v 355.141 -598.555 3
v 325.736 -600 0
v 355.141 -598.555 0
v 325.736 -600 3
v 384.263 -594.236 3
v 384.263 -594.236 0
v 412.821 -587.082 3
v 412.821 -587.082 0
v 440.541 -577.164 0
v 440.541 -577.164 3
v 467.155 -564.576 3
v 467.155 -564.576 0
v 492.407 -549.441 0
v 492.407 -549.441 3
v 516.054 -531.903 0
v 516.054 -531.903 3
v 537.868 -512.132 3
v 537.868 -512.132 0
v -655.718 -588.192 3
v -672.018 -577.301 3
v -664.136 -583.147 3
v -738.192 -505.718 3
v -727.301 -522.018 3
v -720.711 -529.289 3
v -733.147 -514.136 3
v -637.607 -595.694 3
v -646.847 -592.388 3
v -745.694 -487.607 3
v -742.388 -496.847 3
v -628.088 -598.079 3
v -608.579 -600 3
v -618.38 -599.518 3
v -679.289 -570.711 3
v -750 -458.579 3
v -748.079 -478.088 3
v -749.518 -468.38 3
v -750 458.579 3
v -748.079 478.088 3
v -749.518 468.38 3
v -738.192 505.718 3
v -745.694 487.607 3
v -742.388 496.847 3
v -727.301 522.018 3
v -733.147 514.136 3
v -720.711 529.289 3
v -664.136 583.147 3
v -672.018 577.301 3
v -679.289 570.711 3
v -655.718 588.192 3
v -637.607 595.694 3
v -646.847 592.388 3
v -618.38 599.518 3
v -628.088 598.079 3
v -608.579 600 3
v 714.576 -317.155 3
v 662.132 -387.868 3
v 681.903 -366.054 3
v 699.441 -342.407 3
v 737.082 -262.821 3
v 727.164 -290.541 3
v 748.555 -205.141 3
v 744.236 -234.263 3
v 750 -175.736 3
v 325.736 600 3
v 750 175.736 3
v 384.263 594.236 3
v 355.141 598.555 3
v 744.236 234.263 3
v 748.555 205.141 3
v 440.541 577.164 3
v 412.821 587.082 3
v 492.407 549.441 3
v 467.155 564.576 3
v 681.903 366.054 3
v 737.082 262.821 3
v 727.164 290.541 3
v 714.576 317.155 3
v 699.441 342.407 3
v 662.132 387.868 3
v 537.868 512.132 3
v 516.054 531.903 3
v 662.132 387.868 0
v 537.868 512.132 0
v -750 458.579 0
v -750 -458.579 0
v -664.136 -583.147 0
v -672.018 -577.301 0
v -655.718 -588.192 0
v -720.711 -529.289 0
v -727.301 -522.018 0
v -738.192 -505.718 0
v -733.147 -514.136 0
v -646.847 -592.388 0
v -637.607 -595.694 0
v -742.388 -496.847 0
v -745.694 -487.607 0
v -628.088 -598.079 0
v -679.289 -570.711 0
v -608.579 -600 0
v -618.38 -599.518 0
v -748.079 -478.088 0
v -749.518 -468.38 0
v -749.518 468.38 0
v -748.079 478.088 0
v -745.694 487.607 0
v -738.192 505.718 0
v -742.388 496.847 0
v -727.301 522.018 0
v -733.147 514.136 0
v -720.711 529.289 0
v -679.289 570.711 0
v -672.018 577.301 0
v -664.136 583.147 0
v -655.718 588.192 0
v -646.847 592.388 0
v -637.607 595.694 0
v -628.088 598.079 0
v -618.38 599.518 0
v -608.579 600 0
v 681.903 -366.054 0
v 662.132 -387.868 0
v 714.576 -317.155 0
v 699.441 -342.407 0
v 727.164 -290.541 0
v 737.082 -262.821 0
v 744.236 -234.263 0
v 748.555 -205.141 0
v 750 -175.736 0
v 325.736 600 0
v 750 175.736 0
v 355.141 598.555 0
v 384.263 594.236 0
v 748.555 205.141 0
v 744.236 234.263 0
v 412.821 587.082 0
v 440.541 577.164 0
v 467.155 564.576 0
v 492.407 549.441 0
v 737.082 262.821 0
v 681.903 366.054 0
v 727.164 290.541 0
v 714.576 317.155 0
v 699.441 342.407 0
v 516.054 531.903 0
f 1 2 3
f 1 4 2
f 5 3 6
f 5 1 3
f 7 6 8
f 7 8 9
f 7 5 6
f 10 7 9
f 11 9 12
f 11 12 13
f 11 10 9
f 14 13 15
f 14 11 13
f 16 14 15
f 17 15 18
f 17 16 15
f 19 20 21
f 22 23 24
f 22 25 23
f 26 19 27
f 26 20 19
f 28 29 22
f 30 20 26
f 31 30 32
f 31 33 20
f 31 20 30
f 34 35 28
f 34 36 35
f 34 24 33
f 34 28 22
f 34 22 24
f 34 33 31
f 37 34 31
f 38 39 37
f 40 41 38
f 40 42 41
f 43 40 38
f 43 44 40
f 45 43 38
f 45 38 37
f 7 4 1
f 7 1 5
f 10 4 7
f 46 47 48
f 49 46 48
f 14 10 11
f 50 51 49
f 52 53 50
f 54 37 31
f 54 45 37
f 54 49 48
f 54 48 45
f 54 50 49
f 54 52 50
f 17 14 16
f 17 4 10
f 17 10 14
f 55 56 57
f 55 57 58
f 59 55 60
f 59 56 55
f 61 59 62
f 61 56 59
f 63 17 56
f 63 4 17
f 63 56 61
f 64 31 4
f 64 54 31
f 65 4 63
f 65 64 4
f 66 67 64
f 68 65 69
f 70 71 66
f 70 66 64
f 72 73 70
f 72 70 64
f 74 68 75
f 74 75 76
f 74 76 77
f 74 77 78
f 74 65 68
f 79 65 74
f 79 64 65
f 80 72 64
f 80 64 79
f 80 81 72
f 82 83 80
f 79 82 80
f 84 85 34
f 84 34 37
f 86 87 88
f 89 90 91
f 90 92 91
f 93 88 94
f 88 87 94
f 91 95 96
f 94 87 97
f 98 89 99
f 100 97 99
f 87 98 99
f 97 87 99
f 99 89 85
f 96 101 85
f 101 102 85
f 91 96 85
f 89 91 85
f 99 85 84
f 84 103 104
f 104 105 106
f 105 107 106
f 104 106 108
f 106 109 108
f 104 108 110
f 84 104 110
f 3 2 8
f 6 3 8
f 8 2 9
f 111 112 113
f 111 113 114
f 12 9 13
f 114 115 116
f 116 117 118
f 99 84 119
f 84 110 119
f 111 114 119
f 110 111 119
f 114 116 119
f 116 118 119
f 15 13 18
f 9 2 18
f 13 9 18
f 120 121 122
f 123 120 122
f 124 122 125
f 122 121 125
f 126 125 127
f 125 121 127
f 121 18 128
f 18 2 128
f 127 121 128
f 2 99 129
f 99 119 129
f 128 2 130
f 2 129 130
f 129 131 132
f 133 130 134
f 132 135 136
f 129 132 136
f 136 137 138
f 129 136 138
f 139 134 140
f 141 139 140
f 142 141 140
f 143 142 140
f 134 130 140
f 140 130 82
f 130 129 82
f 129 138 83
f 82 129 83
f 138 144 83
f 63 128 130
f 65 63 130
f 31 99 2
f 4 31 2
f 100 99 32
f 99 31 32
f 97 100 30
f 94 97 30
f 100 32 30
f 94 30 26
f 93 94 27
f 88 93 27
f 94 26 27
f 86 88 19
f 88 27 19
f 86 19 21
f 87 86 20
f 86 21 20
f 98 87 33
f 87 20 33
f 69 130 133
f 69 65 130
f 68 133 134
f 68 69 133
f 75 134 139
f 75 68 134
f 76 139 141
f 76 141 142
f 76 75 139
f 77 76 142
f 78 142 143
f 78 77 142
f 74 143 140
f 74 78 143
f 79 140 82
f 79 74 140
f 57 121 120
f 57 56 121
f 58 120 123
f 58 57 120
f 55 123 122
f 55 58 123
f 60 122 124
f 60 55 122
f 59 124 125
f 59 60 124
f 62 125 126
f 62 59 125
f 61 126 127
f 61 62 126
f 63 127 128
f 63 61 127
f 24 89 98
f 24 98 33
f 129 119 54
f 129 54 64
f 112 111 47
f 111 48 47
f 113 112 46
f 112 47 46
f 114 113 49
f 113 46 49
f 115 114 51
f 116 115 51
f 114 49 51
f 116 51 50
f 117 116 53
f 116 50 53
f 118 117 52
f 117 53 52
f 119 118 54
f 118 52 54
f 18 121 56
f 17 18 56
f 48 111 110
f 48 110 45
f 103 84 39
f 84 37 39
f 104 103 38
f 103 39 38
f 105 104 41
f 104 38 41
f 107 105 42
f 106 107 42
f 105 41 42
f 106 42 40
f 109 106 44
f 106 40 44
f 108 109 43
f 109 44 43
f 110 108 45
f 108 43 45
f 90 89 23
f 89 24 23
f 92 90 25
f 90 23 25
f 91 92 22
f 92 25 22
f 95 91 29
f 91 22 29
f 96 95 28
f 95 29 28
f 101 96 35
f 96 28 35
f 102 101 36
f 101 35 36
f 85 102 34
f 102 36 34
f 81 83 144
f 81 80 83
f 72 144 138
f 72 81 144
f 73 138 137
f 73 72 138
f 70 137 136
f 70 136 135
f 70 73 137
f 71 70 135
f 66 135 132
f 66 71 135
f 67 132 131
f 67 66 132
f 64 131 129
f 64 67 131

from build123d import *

# Parameters (mm, degrees)
F0_W     = 1500
F0_H     = 1200
F1_DEPTH = 3
F2_SIZE  = 300
F3_SIZE  = 100
F4_R     = 300
F5_R     = 100


with BuildPart() as f1:
    # F0 (on Top) → F1 (new body)
    with BuildSketch(Plane.XY):
        Rectangle(F0_W, F0_H)
    extrude(amount=F1_DEPTH)

    # F2
    f2_edges = [f1.edges().sort_by_distance(p)[0] for p in [
        (750, -600, 1.5),
        (750, 600, 1.5),
    ]]
    chamfer(f2_edges, length=F2_SIZE)

    # F3
    f3_edges = [f1.edges().sort_by_distance(p)[0] for p in [
        (-750, -600, 1.5),
        (-750, 600, 1.5),
    ]]
    chamfer(f3_edges, length=F3_SIZE)

    # F4
    f4_edges = [f1.edges().sort_by_distance(p)[0] for p in [
        (750, -300, 1.5),
        (450, -600, 1.5),
        (750, 300, 1.5),
        (450, 600, 1.5),
    ]]
    fillet(f4_edges, radius=F4_R)

    # F5
    f5_edges = [f1.edges().sort_by_distance(p)[0] for p in [
        (-750, -500, 1.5),
        (-650, -600, 1.5),
        (-650, 600, 1.5),
        (-750, 500, 1.5),
    ]]
    fillet(f5_edges, radius=F5_R)


solid = f1.part
